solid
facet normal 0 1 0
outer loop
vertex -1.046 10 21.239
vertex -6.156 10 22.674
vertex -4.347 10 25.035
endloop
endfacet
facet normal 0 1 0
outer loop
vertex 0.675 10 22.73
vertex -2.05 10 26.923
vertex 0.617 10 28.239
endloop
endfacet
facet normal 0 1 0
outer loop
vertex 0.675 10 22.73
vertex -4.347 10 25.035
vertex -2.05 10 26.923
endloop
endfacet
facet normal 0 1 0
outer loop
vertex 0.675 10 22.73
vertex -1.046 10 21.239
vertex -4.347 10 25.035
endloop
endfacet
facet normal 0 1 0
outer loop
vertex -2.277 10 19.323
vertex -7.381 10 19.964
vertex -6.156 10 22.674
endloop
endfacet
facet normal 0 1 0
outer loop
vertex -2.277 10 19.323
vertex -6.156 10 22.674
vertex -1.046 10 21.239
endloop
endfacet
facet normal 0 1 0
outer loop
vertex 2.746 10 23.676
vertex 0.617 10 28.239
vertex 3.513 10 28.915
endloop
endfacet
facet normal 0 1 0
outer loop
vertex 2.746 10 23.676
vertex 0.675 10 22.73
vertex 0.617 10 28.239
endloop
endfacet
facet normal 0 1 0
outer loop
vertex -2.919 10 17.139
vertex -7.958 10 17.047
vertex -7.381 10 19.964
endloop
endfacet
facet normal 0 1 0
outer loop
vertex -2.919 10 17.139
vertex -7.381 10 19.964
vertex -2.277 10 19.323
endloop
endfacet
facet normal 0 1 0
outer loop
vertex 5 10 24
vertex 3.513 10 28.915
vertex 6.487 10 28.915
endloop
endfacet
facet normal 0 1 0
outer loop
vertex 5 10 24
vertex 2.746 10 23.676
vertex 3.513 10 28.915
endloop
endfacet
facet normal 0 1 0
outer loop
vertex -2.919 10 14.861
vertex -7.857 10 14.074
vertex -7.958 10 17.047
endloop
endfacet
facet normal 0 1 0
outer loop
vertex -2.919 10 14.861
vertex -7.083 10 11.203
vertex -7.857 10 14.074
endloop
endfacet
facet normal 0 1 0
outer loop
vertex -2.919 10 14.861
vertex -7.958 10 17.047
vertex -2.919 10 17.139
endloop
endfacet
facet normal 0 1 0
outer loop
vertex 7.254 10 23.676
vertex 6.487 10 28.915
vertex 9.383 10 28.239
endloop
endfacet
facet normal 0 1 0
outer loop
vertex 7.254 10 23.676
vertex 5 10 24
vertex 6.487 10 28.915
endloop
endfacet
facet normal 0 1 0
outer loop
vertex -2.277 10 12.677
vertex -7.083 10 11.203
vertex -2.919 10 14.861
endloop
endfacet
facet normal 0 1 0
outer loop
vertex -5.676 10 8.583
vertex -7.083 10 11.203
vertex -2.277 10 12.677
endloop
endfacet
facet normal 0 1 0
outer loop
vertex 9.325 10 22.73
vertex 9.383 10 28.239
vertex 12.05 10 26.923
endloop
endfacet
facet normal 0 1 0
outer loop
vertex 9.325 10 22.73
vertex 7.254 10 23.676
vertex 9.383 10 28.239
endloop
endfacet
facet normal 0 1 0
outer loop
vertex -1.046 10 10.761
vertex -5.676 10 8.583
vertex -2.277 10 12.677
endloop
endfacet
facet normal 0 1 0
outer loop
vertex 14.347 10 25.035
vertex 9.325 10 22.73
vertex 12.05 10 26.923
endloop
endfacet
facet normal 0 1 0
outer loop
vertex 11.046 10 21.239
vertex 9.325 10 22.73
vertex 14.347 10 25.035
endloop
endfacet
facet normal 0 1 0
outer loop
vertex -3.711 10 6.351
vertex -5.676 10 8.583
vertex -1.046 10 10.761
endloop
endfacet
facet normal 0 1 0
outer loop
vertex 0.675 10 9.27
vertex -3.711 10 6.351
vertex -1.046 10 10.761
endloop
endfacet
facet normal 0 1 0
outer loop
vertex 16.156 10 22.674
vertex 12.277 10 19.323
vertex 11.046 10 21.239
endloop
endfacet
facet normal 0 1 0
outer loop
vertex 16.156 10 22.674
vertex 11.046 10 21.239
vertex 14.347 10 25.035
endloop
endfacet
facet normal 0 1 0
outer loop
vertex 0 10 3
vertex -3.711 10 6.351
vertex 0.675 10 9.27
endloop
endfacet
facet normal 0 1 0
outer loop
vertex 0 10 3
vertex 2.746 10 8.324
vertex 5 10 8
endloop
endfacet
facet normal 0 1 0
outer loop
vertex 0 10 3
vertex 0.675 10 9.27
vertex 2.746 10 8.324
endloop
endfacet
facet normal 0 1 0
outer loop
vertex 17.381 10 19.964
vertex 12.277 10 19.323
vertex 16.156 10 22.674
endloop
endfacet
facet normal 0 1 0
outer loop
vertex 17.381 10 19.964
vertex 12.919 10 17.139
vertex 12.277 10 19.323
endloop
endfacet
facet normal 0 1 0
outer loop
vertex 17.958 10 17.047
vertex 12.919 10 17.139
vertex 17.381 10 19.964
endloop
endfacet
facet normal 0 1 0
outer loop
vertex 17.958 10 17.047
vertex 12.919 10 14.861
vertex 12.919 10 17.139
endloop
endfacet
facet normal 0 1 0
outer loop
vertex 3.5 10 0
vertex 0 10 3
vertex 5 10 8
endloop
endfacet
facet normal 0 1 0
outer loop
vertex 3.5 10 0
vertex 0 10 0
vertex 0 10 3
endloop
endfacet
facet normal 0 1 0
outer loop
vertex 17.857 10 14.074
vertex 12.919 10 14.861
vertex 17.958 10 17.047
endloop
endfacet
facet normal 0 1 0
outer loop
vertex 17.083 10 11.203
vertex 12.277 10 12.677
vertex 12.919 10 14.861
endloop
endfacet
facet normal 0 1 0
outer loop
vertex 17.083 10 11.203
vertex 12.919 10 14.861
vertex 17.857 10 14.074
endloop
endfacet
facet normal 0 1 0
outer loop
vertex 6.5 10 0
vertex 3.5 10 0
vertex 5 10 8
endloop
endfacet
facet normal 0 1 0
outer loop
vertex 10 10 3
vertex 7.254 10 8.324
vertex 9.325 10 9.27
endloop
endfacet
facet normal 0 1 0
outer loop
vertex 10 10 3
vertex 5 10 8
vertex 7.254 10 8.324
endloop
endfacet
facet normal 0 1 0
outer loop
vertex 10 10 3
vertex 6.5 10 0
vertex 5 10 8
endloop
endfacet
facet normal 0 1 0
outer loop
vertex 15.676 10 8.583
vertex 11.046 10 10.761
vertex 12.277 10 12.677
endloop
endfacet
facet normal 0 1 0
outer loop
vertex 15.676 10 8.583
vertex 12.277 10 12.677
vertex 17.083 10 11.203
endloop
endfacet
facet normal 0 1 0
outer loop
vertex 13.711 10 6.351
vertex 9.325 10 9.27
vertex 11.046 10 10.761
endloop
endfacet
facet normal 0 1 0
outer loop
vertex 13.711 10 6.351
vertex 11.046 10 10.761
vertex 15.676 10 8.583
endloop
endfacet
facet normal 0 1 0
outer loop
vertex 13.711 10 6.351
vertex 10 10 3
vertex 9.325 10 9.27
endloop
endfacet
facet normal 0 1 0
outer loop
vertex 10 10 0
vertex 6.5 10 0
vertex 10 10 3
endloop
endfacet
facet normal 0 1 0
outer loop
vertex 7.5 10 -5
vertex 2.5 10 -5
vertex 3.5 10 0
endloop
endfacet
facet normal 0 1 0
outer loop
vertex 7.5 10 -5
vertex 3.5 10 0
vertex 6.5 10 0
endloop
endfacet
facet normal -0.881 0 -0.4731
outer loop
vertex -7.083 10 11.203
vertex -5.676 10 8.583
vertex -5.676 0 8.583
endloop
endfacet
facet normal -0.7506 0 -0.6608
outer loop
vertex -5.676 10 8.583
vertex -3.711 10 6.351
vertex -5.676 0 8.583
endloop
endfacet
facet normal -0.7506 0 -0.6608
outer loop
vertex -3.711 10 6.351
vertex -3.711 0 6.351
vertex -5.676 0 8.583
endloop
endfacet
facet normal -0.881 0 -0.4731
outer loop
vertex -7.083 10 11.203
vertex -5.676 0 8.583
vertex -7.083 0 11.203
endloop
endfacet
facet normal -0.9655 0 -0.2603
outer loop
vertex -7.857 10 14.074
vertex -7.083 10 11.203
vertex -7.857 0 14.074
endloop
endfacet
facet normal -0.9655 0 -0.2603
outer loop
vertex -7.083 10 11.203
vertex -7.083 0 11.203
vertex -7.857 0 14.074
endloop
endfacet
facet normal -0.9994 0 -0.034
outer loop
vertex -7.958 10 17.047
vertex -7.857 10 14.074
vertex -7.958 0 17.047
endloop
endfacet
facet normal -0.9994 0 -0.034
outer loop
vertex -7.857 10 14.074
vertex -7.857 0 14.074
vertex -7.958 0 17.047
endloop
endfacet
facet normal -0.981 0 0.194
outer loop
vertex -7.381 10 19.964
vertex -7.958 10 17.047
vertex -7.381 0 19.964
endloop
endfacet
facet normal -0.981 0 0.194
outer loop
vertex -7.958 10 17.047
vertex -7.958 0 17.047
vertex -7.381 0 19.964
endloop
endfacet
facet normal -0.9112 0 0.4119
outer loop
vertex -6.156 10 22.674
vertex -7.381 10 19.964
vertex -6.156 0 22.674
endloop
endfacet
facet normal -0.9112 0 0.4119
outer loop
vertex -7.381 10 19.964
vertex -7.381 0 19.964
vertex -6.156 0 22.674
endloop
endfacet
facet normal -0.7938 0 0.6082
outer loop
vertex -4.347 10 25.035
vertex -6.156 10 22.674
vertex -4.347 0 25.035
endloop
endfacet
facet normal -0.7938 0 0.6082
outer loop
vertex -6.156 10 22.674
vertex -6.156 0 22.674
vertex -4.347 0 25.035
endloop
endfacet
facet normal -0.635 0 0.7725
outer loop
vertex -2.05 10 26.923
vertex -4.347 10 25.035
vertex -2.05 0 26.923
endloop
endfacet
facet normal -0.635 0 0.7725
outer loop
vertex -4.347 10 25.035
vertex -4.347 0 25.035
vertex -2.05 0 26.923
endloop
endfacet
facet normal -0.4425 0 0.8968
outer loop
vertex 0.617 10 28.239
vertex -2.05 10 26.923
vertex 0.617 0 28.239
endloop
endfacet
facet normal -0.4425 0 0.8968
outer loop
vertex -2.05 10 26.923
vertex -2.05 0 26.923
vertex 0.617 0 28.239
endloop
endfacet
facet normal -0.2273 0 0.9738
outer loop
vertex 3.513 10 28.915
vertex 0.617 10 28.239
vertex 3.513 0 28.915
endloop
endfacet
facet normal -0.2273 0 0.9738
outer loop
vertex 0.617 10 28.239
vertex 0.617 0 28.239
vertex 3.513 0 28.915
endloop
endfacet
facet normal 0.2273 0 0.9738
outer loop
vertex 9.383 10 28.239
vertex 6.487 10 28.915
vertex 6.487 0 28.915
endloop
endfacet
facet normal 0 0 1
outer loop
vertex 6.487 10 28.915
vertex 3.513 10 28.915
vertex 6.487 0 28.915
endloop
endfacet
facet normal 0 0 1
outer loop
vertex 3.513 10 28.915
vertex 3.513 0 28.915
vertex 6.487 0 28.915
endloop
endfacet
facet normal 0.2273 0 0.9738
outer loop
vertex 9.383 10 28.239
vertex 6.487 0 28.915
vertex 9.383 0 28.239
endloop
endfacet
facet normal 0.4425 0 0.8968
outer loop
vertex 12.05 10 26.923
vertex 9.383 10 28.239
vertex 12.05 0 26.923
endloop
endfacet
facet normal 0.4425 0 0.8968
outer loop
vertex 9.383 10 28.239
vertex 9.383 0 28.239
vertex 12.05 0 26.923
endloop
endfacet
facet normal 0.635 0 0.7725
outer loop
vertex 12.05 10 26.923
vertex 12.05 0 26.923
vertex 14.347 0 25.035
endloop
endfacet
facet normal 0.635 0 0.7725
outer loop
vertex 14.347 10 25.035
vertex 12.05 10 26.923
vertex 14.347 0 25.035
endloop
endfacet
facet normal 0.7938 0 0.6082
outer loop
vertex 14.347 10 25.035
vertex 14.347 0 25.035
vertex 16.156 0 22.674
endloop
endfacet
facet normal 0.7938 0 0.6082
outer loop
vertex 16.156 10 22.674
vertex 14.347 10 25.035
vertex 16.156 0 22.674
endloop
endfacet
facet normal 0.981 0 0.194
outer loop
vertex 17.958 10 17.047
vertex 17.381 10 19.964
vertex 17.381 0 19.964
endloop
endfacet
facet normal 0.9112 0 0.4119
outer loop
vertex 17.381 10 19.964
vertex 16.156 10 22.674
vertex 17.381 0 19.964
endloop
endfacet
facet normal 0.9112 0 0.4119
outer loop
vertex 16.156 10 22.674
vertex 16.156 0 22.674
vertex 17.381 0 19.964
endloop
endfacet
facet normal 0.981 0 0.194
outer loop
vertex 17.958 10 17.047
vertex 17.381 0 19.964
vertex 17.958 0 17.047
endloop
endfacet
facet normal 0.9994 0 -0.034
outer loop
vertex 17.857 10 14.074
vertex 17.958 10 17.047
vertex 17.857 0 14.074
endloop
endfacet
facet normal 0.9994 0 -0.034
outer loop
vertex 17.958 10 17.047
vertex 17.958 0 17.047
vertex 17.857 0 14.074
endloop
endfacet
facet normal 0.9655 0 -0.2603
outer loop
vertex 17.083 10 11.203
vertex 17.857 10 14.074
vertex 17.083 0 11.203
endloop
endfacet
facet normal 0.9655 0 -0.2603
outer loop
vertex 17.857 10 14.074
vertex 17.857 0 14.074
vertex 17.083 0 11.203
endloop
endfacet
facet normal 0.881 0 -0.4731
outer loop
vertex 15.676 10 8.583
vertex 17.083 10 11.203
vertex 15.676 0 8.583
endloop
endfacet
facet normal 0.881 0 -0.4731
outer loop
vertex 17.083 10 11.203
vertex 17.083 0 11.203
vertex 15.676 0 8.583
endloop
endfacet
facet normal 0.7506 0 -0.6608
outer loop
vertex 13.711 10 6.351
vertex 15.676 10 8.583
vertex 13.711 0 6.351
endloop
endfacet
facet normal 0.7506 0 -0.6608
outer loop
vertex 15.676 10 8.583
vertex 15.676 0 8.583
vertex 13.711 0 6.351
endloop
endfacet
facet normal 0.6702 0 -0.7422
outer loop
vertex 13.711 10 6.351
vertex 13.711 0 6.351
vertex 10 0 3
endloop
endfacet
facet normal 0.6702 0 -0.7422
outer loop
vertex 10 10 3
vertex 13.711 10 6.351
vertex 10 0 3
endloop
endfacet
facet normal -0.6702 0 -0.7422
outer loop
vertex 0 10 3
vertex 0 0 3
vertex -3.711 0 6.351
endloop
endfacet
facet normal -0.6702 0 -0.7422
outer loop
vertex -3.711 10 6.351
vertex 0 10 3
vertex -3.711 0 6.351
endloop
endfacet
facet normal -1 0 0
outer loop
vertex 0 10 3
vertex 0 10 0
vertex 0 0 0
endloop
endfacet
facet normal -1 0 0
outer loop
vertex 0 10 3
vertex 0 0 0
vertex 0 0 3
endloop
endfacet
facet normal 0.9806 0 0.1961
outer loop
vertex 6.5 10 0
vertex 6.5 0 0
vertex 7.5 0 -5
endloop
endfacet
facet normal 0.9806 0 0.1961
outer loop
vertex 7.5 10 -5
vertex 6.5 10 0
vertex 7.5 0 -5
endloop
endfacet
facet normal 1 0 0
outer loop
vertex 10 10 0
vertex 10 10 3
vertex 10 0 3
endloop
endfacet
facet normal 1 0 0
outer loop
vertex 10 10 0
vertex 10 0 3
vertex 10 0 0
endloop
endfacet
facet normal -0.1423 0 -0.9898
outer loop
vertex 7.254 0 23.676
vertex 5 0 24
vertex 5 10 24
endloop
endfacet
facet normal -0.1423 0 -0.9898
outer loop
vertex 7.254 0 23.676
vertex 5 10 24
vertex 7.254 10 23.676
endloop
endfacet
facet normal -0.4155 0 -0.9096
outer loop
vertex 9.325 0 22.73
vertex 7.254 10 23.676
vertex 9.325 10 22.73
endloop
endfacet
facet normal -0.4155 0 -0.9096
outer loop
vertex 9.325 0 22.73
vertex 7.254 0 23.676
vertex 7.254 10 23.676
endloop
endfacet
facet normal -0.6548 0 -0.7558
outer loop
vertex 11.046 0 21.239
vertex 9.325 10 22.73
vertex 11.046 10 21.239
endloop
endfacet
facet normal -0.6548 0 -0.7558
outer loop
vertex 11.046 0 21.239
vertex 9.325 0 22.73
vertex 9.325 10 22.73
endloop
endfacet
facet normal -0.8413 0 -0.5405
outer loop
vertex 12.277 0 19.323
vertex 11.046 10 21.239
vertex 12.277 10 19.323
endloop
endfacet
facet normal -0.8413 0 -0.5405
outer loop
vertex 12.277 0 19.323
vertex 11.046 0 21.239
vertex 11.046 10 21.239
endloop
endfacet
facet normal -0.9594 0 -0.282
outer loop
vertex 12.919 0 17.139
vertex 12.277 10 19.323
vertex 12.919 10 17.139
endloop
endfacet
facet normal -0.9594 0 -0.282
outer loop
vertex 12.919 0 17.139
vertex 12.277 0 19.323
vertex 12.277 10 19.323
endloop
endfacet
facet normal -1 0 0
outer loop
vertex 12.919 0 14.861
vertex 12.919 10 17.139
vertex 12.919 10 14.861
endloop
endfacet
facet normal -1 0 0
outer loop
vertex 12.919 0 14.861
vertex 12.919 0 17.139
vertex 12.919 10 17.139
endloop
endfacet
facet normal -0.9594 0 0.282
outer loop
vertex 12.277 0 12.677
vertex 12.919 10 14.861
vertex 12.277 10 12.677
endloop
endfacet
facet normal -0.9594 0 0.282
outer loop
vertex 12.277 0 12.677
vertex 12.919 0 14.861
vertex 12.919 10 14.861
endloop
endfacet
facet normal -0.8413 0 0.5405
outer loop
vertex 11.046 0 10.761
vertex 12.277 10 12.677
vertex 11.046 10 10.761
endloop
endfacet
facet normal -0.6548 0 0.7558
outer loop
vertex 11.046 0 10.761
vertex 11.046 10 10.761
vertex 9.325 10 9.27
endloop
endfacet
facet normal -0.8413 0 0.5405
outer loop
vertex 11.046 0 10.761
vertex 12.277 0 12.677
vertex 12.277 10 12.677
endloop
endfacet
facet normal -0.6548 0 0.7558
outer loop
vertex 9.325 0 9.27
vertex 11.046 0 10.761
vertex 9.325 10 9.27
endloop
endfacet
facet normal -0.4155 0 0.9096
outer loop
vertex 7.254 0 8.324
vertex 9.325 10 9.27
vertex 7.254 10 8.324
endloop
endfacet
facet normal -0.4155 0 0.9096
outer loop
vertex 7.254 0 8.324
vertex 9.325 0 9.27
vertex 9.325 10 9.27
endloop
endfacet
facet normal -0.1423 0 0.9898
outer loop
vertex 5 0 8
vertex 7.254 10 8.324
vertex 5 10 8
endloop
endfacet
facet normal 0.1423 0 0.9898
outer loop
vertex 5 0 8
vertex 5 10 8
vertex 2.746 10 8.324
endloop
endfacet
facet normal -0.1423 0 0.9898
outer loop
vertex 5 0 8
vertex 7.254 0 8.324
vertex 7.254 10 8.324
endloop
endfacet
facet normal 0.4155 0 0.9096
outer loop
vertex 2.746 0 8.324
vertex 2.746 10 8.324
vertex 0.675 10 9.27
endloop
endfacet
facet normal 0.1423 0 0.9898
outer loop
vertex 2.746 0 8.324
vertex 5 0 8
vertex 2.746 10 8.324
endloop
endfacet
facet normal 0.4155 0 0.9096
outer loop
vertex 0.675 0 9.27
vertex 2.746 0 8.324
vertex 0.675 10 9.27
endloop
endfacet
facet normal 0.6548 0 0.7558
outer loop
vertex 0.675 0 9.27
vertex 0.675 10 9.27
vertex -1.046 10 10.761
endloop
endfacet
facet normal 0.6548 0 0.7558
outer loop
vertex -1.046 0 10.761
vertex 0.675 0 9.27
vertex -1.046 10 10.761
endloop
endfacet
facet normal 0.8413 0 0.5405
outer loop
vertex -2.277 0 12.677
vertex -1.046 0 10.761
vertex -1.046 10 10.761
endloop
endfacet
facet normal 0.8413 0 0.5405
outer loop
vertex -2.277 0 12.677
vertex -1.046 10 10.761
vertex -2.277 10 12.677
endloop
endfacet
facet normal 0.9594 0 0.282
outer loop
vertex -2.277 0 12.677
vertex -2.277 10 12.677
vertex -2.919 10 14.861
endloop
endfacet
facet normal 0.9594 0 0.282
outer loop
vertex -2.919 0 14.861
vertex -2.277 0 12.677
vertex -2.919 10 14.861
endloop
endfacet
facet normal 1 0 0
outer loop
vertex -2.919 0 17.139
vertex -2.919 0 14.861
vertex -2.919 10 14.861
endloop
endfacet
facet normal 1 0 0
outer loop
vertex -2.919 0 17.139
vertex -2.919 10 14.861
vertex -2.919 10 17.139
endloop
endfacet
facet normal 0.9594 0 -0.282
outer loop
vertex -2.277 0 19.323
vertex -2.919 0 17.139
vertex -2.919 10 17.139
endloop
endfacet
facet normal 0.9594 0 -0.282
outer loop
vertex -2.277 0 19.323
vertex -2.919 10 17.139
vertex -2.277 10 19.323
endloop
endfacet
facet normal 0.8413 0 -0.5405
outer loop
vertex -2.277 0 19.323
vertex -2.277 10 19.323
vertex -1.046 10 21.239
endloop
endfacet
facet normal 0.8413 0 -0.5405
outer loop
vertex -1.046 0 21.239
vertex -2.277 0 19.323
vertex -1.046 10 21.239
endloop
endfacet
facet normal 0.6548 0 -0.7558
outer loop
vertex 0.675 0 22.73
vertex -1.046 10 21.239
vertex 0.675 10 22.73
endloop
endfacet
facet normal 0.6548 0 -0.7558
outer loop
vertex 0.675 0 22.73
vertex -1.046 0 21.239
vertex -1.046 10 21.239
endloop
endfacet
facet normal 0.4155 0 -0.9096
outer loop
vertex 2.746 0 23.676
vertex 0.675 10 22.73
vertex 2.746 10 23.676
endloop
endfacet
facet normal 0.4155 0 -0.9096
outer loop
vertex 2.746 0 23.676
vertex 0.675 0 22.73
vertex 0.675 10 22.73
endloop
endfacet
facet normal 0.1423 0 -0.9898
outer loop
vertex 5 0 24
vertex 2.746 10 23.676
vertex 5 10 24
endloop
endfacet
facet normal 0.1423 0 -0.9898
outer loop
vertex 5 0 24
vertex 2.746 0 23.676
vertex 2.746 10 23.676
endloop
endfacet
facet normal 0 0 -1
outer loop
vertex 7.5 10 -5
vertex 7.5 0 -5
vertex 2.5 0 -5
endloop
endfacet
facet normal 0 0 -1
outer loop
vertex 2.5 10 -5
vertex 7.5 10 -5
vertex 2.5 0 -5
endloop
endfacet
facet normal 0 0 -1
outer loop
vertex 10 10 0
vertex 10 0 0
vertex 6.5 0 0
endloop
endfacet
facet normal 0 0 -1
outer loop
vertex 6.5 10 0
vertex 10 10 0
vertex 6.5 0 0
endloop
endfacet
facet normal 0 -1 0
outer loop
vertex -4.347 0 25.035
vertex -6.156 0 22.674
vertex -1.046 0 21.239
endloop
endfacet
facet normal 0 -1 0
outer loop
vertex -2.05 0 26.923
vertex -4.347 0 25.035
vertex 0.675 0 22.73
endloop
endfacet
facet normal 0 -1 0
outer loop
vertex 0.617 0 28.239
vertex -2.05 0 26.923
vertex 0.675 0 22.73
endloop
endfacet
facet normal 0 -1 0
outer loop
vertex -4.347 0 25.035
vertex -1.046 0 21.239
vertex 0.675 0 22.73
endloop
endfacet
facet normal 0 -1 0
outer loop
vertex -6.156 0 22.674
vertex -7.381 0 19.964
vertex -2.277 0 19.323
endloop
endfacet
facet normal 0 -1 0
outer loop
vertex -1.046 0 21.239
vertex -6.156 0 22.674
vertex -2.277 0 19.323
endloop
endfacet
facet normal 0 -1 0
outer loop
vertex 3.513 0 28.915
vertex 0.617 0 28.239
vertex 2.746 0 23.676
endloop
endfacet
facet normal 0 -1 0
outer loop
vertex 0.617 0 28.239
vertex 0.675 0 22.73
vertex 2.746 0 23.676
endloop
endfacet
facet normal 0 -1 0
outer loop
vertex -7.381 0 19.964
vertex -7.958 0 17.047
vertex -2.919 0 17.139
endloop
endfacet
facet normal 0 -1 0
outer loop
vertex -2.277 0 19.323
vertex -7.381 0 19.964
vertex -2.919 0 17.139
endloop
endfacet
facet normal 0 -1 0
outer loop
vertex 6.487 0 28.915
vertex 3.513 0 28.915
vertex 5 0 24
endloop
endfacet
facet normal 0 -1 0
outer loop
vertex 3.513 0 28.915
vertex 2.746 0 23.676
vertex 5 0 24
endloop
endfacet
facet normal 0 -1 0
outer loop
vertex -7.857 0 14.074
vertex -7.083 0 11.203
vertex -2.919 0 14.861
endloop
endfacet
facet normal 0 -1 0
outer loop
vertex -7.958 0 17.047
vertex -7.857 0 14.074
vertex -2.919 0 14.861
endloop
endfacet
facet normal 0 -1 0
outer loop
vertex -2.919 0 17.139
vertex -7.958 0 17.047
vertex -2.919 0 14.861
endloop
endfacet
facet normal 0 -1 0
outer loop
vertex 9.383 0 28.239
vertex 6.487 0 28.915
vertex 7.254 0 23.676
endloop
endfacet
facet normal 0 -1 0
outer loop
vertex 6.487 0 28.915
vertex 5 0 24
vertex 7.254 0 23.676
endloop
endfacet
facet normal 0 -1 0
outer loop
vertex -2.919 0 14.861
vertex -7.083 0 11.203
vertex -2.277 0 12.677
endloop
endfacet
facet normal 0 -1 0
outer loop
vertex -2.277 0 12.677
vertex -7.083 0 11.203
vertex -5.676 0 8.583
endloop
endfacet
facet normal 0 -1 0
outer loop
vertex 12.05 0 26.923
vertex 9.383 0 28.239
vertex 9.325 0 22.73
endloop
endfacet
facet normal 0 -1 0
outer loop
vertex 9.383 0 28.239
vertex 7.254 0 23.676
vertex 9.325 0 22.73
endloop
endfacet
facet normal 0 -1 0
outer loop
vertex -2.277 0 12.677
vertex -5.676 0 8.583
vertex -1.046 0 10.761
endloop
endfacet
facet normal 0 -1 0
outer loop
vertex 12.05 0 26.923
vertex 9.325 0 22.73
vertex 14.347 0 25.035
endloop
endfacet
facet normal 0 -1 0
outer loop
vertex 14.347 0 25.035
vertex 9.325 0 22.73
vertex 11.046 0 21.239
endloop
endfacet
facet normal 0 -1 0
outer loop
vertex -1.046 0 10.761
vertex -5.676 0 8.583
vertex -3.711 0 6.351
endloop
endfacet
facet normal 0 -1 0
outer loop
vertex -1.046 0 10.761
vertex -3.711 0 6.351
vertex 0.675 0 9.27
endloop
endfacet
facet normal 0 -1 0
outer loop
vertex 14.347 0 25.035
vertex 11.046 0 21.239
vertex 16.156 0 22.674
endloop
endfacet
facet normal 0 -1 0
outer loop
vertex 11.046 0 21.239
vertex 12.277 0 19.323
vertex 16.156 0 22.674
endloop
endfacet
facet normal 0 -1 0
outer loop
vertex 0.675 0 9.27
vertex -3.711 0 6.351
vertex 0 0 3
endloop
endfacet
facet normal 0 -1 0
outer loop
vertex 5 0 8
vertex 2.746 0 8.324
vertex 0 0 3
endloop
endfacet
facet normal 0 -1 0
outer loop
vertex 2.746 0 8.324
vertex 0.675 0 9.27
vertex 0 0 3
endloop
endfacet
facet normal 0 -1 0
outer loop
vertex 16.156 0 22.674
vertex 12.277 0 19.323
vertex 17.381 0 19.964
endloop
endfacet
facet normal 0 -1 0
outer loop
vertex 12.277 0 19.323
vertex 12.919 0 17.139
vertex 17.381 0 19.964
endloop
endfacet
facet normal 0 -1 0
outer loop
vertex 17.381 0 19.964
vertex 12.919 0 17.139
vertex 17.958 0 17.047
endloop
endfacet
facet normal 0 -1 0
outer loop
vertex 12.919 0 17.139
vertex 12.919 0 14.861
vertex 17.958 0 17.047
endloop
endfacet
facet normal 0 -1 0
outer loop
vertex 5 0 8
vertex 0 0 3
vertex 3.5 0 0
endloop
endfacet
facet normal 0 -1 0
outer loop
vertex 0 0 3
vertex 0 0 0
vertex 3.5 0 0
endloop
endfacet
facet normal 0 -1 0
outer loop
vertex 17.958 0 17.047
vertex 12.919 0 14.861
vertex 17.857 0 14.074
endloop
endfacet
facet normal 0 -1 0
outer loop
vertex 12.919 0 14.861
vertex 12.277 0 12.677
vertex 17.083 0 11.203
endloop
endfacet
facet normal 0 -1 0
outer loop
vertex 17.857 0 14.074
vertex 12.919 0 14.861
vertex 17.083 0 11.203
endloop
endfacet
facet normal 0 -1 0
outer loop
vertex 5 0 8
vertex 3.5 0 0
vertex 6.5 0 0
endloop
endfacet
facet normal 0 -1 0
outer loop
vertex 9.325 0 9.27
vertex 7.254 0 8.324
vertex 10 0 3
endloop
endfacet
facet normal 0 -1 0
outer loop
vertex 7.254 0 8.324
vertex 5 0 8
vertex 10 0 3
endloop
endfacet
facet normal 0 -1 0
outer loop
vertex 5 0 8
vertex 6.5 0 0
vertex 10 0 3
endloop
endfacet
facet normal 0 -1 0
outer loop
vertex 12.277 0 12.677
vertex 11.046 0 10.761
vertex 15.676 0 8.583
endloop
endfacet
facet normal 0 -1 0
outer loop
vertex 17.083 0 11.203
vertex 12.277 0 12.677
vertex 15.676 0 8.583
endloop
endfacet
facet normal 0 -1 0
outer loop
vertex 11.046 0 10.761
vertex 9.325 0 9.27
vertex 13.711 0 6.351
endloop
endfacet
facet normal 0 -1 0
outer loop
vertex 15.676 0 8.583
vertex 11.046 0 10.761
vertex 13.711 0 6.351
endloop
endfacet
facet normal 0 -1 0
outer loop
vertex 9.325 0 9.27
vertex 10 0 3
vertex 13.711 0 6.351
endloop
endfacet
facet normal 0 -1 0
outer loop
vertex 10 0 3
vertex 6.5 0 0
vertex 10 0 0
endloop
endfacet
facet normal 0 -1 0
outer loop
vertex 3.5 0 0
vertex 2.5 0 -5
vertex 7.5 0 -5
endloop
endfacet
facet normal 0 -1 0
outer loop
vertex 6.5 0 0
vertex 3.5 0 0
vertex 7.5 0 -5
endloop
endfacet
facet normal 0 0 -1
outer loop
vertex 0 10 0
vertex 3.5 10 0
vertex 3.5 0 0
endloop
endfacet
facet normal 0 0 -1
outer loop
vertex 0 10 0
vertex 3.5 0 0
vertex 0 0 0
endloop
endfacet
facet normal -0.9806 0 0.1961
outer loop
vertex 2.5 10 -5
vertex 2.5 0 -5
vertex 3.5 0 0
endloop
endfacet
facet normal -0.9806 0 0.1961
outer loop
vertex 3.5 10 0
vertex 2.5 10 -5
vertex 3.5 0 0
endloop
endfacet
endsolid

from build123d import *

# Parameters (mm, degrees)
SKETCH1_R           = 13
SKETCH1_R_2         = 8
BOSS_EXTRUDE1_DEPTH = 10


with BuildPart() as part:
    # Sketch1 → Boss-Extrude1 (new body)
    # profile 1 of 5: a face of its own
    with BuildSketch(Plane(origin=(0, 0, 0), x_dir=(1, 0, 0), z_dir=(0, 1, 0))):
        with Locations((5, -16)):
            Circle(SKETCH1_R)
        with Locations(Location((5, -16, 0), (0, 0, 270))):
            Circle(SKETCH1_R_2, mode=Mode.SUBTRACT)
    # profile 2 of 5: a face of its own
    with BuildSketch(Plane(origin=(0, 0, 0), x_dir=(1, 0, 0), z_dir=(0, 1, 0))):
        with BuildLine():
            Line((10, -3), (5, -3))
            ThreePointArc((5, -3), (9.666728031, -3.866507119), (13.711340206, -6.350515464))
            Line((13.711340206, -6.350515464), (10, -3))
        make_face()
    # profile 3 of 5: a face of its own
    with BuildSketch(Plane(origin=(0, 0, 0), x_dir=(1, 0, 0), z_dir=(0, 1, 0))):
        Polygon((7.5, 5), (5, 5), (5, -3), (10, -3), (10, 0), (6.5, 0), align=None)
    # profile 4 of 5: a face of its own
    with BuildSketch(Plane(origin=(0, 0, 0), x_dir=(1, 0, 0), z_dir=(0, 1, 0))):
        Polygon((2.5, 5), (3.5, 0), (0, 0), (0, -3), (5, -3), (5, 5), align=None)
    # profile 5 of 5: a face of its own
    with BuildSketch(Plane(origin=(0, 0, 0), x_dir=(1, 0, 0), z_dir=(0, 1, 0))):
        with BuildLine():
            Line((5, -3), (0, -3))
            Line((0, -3), (-3.711340206, -6.350515464))
            ThreePointArc((-3.711340206, -6.350515464), (0.333271969, -3.866507119), (5, -3))
        make_face()
    extrude(amount=BOSS_EXTRUDE1_DEPTH)


solid = part.part
